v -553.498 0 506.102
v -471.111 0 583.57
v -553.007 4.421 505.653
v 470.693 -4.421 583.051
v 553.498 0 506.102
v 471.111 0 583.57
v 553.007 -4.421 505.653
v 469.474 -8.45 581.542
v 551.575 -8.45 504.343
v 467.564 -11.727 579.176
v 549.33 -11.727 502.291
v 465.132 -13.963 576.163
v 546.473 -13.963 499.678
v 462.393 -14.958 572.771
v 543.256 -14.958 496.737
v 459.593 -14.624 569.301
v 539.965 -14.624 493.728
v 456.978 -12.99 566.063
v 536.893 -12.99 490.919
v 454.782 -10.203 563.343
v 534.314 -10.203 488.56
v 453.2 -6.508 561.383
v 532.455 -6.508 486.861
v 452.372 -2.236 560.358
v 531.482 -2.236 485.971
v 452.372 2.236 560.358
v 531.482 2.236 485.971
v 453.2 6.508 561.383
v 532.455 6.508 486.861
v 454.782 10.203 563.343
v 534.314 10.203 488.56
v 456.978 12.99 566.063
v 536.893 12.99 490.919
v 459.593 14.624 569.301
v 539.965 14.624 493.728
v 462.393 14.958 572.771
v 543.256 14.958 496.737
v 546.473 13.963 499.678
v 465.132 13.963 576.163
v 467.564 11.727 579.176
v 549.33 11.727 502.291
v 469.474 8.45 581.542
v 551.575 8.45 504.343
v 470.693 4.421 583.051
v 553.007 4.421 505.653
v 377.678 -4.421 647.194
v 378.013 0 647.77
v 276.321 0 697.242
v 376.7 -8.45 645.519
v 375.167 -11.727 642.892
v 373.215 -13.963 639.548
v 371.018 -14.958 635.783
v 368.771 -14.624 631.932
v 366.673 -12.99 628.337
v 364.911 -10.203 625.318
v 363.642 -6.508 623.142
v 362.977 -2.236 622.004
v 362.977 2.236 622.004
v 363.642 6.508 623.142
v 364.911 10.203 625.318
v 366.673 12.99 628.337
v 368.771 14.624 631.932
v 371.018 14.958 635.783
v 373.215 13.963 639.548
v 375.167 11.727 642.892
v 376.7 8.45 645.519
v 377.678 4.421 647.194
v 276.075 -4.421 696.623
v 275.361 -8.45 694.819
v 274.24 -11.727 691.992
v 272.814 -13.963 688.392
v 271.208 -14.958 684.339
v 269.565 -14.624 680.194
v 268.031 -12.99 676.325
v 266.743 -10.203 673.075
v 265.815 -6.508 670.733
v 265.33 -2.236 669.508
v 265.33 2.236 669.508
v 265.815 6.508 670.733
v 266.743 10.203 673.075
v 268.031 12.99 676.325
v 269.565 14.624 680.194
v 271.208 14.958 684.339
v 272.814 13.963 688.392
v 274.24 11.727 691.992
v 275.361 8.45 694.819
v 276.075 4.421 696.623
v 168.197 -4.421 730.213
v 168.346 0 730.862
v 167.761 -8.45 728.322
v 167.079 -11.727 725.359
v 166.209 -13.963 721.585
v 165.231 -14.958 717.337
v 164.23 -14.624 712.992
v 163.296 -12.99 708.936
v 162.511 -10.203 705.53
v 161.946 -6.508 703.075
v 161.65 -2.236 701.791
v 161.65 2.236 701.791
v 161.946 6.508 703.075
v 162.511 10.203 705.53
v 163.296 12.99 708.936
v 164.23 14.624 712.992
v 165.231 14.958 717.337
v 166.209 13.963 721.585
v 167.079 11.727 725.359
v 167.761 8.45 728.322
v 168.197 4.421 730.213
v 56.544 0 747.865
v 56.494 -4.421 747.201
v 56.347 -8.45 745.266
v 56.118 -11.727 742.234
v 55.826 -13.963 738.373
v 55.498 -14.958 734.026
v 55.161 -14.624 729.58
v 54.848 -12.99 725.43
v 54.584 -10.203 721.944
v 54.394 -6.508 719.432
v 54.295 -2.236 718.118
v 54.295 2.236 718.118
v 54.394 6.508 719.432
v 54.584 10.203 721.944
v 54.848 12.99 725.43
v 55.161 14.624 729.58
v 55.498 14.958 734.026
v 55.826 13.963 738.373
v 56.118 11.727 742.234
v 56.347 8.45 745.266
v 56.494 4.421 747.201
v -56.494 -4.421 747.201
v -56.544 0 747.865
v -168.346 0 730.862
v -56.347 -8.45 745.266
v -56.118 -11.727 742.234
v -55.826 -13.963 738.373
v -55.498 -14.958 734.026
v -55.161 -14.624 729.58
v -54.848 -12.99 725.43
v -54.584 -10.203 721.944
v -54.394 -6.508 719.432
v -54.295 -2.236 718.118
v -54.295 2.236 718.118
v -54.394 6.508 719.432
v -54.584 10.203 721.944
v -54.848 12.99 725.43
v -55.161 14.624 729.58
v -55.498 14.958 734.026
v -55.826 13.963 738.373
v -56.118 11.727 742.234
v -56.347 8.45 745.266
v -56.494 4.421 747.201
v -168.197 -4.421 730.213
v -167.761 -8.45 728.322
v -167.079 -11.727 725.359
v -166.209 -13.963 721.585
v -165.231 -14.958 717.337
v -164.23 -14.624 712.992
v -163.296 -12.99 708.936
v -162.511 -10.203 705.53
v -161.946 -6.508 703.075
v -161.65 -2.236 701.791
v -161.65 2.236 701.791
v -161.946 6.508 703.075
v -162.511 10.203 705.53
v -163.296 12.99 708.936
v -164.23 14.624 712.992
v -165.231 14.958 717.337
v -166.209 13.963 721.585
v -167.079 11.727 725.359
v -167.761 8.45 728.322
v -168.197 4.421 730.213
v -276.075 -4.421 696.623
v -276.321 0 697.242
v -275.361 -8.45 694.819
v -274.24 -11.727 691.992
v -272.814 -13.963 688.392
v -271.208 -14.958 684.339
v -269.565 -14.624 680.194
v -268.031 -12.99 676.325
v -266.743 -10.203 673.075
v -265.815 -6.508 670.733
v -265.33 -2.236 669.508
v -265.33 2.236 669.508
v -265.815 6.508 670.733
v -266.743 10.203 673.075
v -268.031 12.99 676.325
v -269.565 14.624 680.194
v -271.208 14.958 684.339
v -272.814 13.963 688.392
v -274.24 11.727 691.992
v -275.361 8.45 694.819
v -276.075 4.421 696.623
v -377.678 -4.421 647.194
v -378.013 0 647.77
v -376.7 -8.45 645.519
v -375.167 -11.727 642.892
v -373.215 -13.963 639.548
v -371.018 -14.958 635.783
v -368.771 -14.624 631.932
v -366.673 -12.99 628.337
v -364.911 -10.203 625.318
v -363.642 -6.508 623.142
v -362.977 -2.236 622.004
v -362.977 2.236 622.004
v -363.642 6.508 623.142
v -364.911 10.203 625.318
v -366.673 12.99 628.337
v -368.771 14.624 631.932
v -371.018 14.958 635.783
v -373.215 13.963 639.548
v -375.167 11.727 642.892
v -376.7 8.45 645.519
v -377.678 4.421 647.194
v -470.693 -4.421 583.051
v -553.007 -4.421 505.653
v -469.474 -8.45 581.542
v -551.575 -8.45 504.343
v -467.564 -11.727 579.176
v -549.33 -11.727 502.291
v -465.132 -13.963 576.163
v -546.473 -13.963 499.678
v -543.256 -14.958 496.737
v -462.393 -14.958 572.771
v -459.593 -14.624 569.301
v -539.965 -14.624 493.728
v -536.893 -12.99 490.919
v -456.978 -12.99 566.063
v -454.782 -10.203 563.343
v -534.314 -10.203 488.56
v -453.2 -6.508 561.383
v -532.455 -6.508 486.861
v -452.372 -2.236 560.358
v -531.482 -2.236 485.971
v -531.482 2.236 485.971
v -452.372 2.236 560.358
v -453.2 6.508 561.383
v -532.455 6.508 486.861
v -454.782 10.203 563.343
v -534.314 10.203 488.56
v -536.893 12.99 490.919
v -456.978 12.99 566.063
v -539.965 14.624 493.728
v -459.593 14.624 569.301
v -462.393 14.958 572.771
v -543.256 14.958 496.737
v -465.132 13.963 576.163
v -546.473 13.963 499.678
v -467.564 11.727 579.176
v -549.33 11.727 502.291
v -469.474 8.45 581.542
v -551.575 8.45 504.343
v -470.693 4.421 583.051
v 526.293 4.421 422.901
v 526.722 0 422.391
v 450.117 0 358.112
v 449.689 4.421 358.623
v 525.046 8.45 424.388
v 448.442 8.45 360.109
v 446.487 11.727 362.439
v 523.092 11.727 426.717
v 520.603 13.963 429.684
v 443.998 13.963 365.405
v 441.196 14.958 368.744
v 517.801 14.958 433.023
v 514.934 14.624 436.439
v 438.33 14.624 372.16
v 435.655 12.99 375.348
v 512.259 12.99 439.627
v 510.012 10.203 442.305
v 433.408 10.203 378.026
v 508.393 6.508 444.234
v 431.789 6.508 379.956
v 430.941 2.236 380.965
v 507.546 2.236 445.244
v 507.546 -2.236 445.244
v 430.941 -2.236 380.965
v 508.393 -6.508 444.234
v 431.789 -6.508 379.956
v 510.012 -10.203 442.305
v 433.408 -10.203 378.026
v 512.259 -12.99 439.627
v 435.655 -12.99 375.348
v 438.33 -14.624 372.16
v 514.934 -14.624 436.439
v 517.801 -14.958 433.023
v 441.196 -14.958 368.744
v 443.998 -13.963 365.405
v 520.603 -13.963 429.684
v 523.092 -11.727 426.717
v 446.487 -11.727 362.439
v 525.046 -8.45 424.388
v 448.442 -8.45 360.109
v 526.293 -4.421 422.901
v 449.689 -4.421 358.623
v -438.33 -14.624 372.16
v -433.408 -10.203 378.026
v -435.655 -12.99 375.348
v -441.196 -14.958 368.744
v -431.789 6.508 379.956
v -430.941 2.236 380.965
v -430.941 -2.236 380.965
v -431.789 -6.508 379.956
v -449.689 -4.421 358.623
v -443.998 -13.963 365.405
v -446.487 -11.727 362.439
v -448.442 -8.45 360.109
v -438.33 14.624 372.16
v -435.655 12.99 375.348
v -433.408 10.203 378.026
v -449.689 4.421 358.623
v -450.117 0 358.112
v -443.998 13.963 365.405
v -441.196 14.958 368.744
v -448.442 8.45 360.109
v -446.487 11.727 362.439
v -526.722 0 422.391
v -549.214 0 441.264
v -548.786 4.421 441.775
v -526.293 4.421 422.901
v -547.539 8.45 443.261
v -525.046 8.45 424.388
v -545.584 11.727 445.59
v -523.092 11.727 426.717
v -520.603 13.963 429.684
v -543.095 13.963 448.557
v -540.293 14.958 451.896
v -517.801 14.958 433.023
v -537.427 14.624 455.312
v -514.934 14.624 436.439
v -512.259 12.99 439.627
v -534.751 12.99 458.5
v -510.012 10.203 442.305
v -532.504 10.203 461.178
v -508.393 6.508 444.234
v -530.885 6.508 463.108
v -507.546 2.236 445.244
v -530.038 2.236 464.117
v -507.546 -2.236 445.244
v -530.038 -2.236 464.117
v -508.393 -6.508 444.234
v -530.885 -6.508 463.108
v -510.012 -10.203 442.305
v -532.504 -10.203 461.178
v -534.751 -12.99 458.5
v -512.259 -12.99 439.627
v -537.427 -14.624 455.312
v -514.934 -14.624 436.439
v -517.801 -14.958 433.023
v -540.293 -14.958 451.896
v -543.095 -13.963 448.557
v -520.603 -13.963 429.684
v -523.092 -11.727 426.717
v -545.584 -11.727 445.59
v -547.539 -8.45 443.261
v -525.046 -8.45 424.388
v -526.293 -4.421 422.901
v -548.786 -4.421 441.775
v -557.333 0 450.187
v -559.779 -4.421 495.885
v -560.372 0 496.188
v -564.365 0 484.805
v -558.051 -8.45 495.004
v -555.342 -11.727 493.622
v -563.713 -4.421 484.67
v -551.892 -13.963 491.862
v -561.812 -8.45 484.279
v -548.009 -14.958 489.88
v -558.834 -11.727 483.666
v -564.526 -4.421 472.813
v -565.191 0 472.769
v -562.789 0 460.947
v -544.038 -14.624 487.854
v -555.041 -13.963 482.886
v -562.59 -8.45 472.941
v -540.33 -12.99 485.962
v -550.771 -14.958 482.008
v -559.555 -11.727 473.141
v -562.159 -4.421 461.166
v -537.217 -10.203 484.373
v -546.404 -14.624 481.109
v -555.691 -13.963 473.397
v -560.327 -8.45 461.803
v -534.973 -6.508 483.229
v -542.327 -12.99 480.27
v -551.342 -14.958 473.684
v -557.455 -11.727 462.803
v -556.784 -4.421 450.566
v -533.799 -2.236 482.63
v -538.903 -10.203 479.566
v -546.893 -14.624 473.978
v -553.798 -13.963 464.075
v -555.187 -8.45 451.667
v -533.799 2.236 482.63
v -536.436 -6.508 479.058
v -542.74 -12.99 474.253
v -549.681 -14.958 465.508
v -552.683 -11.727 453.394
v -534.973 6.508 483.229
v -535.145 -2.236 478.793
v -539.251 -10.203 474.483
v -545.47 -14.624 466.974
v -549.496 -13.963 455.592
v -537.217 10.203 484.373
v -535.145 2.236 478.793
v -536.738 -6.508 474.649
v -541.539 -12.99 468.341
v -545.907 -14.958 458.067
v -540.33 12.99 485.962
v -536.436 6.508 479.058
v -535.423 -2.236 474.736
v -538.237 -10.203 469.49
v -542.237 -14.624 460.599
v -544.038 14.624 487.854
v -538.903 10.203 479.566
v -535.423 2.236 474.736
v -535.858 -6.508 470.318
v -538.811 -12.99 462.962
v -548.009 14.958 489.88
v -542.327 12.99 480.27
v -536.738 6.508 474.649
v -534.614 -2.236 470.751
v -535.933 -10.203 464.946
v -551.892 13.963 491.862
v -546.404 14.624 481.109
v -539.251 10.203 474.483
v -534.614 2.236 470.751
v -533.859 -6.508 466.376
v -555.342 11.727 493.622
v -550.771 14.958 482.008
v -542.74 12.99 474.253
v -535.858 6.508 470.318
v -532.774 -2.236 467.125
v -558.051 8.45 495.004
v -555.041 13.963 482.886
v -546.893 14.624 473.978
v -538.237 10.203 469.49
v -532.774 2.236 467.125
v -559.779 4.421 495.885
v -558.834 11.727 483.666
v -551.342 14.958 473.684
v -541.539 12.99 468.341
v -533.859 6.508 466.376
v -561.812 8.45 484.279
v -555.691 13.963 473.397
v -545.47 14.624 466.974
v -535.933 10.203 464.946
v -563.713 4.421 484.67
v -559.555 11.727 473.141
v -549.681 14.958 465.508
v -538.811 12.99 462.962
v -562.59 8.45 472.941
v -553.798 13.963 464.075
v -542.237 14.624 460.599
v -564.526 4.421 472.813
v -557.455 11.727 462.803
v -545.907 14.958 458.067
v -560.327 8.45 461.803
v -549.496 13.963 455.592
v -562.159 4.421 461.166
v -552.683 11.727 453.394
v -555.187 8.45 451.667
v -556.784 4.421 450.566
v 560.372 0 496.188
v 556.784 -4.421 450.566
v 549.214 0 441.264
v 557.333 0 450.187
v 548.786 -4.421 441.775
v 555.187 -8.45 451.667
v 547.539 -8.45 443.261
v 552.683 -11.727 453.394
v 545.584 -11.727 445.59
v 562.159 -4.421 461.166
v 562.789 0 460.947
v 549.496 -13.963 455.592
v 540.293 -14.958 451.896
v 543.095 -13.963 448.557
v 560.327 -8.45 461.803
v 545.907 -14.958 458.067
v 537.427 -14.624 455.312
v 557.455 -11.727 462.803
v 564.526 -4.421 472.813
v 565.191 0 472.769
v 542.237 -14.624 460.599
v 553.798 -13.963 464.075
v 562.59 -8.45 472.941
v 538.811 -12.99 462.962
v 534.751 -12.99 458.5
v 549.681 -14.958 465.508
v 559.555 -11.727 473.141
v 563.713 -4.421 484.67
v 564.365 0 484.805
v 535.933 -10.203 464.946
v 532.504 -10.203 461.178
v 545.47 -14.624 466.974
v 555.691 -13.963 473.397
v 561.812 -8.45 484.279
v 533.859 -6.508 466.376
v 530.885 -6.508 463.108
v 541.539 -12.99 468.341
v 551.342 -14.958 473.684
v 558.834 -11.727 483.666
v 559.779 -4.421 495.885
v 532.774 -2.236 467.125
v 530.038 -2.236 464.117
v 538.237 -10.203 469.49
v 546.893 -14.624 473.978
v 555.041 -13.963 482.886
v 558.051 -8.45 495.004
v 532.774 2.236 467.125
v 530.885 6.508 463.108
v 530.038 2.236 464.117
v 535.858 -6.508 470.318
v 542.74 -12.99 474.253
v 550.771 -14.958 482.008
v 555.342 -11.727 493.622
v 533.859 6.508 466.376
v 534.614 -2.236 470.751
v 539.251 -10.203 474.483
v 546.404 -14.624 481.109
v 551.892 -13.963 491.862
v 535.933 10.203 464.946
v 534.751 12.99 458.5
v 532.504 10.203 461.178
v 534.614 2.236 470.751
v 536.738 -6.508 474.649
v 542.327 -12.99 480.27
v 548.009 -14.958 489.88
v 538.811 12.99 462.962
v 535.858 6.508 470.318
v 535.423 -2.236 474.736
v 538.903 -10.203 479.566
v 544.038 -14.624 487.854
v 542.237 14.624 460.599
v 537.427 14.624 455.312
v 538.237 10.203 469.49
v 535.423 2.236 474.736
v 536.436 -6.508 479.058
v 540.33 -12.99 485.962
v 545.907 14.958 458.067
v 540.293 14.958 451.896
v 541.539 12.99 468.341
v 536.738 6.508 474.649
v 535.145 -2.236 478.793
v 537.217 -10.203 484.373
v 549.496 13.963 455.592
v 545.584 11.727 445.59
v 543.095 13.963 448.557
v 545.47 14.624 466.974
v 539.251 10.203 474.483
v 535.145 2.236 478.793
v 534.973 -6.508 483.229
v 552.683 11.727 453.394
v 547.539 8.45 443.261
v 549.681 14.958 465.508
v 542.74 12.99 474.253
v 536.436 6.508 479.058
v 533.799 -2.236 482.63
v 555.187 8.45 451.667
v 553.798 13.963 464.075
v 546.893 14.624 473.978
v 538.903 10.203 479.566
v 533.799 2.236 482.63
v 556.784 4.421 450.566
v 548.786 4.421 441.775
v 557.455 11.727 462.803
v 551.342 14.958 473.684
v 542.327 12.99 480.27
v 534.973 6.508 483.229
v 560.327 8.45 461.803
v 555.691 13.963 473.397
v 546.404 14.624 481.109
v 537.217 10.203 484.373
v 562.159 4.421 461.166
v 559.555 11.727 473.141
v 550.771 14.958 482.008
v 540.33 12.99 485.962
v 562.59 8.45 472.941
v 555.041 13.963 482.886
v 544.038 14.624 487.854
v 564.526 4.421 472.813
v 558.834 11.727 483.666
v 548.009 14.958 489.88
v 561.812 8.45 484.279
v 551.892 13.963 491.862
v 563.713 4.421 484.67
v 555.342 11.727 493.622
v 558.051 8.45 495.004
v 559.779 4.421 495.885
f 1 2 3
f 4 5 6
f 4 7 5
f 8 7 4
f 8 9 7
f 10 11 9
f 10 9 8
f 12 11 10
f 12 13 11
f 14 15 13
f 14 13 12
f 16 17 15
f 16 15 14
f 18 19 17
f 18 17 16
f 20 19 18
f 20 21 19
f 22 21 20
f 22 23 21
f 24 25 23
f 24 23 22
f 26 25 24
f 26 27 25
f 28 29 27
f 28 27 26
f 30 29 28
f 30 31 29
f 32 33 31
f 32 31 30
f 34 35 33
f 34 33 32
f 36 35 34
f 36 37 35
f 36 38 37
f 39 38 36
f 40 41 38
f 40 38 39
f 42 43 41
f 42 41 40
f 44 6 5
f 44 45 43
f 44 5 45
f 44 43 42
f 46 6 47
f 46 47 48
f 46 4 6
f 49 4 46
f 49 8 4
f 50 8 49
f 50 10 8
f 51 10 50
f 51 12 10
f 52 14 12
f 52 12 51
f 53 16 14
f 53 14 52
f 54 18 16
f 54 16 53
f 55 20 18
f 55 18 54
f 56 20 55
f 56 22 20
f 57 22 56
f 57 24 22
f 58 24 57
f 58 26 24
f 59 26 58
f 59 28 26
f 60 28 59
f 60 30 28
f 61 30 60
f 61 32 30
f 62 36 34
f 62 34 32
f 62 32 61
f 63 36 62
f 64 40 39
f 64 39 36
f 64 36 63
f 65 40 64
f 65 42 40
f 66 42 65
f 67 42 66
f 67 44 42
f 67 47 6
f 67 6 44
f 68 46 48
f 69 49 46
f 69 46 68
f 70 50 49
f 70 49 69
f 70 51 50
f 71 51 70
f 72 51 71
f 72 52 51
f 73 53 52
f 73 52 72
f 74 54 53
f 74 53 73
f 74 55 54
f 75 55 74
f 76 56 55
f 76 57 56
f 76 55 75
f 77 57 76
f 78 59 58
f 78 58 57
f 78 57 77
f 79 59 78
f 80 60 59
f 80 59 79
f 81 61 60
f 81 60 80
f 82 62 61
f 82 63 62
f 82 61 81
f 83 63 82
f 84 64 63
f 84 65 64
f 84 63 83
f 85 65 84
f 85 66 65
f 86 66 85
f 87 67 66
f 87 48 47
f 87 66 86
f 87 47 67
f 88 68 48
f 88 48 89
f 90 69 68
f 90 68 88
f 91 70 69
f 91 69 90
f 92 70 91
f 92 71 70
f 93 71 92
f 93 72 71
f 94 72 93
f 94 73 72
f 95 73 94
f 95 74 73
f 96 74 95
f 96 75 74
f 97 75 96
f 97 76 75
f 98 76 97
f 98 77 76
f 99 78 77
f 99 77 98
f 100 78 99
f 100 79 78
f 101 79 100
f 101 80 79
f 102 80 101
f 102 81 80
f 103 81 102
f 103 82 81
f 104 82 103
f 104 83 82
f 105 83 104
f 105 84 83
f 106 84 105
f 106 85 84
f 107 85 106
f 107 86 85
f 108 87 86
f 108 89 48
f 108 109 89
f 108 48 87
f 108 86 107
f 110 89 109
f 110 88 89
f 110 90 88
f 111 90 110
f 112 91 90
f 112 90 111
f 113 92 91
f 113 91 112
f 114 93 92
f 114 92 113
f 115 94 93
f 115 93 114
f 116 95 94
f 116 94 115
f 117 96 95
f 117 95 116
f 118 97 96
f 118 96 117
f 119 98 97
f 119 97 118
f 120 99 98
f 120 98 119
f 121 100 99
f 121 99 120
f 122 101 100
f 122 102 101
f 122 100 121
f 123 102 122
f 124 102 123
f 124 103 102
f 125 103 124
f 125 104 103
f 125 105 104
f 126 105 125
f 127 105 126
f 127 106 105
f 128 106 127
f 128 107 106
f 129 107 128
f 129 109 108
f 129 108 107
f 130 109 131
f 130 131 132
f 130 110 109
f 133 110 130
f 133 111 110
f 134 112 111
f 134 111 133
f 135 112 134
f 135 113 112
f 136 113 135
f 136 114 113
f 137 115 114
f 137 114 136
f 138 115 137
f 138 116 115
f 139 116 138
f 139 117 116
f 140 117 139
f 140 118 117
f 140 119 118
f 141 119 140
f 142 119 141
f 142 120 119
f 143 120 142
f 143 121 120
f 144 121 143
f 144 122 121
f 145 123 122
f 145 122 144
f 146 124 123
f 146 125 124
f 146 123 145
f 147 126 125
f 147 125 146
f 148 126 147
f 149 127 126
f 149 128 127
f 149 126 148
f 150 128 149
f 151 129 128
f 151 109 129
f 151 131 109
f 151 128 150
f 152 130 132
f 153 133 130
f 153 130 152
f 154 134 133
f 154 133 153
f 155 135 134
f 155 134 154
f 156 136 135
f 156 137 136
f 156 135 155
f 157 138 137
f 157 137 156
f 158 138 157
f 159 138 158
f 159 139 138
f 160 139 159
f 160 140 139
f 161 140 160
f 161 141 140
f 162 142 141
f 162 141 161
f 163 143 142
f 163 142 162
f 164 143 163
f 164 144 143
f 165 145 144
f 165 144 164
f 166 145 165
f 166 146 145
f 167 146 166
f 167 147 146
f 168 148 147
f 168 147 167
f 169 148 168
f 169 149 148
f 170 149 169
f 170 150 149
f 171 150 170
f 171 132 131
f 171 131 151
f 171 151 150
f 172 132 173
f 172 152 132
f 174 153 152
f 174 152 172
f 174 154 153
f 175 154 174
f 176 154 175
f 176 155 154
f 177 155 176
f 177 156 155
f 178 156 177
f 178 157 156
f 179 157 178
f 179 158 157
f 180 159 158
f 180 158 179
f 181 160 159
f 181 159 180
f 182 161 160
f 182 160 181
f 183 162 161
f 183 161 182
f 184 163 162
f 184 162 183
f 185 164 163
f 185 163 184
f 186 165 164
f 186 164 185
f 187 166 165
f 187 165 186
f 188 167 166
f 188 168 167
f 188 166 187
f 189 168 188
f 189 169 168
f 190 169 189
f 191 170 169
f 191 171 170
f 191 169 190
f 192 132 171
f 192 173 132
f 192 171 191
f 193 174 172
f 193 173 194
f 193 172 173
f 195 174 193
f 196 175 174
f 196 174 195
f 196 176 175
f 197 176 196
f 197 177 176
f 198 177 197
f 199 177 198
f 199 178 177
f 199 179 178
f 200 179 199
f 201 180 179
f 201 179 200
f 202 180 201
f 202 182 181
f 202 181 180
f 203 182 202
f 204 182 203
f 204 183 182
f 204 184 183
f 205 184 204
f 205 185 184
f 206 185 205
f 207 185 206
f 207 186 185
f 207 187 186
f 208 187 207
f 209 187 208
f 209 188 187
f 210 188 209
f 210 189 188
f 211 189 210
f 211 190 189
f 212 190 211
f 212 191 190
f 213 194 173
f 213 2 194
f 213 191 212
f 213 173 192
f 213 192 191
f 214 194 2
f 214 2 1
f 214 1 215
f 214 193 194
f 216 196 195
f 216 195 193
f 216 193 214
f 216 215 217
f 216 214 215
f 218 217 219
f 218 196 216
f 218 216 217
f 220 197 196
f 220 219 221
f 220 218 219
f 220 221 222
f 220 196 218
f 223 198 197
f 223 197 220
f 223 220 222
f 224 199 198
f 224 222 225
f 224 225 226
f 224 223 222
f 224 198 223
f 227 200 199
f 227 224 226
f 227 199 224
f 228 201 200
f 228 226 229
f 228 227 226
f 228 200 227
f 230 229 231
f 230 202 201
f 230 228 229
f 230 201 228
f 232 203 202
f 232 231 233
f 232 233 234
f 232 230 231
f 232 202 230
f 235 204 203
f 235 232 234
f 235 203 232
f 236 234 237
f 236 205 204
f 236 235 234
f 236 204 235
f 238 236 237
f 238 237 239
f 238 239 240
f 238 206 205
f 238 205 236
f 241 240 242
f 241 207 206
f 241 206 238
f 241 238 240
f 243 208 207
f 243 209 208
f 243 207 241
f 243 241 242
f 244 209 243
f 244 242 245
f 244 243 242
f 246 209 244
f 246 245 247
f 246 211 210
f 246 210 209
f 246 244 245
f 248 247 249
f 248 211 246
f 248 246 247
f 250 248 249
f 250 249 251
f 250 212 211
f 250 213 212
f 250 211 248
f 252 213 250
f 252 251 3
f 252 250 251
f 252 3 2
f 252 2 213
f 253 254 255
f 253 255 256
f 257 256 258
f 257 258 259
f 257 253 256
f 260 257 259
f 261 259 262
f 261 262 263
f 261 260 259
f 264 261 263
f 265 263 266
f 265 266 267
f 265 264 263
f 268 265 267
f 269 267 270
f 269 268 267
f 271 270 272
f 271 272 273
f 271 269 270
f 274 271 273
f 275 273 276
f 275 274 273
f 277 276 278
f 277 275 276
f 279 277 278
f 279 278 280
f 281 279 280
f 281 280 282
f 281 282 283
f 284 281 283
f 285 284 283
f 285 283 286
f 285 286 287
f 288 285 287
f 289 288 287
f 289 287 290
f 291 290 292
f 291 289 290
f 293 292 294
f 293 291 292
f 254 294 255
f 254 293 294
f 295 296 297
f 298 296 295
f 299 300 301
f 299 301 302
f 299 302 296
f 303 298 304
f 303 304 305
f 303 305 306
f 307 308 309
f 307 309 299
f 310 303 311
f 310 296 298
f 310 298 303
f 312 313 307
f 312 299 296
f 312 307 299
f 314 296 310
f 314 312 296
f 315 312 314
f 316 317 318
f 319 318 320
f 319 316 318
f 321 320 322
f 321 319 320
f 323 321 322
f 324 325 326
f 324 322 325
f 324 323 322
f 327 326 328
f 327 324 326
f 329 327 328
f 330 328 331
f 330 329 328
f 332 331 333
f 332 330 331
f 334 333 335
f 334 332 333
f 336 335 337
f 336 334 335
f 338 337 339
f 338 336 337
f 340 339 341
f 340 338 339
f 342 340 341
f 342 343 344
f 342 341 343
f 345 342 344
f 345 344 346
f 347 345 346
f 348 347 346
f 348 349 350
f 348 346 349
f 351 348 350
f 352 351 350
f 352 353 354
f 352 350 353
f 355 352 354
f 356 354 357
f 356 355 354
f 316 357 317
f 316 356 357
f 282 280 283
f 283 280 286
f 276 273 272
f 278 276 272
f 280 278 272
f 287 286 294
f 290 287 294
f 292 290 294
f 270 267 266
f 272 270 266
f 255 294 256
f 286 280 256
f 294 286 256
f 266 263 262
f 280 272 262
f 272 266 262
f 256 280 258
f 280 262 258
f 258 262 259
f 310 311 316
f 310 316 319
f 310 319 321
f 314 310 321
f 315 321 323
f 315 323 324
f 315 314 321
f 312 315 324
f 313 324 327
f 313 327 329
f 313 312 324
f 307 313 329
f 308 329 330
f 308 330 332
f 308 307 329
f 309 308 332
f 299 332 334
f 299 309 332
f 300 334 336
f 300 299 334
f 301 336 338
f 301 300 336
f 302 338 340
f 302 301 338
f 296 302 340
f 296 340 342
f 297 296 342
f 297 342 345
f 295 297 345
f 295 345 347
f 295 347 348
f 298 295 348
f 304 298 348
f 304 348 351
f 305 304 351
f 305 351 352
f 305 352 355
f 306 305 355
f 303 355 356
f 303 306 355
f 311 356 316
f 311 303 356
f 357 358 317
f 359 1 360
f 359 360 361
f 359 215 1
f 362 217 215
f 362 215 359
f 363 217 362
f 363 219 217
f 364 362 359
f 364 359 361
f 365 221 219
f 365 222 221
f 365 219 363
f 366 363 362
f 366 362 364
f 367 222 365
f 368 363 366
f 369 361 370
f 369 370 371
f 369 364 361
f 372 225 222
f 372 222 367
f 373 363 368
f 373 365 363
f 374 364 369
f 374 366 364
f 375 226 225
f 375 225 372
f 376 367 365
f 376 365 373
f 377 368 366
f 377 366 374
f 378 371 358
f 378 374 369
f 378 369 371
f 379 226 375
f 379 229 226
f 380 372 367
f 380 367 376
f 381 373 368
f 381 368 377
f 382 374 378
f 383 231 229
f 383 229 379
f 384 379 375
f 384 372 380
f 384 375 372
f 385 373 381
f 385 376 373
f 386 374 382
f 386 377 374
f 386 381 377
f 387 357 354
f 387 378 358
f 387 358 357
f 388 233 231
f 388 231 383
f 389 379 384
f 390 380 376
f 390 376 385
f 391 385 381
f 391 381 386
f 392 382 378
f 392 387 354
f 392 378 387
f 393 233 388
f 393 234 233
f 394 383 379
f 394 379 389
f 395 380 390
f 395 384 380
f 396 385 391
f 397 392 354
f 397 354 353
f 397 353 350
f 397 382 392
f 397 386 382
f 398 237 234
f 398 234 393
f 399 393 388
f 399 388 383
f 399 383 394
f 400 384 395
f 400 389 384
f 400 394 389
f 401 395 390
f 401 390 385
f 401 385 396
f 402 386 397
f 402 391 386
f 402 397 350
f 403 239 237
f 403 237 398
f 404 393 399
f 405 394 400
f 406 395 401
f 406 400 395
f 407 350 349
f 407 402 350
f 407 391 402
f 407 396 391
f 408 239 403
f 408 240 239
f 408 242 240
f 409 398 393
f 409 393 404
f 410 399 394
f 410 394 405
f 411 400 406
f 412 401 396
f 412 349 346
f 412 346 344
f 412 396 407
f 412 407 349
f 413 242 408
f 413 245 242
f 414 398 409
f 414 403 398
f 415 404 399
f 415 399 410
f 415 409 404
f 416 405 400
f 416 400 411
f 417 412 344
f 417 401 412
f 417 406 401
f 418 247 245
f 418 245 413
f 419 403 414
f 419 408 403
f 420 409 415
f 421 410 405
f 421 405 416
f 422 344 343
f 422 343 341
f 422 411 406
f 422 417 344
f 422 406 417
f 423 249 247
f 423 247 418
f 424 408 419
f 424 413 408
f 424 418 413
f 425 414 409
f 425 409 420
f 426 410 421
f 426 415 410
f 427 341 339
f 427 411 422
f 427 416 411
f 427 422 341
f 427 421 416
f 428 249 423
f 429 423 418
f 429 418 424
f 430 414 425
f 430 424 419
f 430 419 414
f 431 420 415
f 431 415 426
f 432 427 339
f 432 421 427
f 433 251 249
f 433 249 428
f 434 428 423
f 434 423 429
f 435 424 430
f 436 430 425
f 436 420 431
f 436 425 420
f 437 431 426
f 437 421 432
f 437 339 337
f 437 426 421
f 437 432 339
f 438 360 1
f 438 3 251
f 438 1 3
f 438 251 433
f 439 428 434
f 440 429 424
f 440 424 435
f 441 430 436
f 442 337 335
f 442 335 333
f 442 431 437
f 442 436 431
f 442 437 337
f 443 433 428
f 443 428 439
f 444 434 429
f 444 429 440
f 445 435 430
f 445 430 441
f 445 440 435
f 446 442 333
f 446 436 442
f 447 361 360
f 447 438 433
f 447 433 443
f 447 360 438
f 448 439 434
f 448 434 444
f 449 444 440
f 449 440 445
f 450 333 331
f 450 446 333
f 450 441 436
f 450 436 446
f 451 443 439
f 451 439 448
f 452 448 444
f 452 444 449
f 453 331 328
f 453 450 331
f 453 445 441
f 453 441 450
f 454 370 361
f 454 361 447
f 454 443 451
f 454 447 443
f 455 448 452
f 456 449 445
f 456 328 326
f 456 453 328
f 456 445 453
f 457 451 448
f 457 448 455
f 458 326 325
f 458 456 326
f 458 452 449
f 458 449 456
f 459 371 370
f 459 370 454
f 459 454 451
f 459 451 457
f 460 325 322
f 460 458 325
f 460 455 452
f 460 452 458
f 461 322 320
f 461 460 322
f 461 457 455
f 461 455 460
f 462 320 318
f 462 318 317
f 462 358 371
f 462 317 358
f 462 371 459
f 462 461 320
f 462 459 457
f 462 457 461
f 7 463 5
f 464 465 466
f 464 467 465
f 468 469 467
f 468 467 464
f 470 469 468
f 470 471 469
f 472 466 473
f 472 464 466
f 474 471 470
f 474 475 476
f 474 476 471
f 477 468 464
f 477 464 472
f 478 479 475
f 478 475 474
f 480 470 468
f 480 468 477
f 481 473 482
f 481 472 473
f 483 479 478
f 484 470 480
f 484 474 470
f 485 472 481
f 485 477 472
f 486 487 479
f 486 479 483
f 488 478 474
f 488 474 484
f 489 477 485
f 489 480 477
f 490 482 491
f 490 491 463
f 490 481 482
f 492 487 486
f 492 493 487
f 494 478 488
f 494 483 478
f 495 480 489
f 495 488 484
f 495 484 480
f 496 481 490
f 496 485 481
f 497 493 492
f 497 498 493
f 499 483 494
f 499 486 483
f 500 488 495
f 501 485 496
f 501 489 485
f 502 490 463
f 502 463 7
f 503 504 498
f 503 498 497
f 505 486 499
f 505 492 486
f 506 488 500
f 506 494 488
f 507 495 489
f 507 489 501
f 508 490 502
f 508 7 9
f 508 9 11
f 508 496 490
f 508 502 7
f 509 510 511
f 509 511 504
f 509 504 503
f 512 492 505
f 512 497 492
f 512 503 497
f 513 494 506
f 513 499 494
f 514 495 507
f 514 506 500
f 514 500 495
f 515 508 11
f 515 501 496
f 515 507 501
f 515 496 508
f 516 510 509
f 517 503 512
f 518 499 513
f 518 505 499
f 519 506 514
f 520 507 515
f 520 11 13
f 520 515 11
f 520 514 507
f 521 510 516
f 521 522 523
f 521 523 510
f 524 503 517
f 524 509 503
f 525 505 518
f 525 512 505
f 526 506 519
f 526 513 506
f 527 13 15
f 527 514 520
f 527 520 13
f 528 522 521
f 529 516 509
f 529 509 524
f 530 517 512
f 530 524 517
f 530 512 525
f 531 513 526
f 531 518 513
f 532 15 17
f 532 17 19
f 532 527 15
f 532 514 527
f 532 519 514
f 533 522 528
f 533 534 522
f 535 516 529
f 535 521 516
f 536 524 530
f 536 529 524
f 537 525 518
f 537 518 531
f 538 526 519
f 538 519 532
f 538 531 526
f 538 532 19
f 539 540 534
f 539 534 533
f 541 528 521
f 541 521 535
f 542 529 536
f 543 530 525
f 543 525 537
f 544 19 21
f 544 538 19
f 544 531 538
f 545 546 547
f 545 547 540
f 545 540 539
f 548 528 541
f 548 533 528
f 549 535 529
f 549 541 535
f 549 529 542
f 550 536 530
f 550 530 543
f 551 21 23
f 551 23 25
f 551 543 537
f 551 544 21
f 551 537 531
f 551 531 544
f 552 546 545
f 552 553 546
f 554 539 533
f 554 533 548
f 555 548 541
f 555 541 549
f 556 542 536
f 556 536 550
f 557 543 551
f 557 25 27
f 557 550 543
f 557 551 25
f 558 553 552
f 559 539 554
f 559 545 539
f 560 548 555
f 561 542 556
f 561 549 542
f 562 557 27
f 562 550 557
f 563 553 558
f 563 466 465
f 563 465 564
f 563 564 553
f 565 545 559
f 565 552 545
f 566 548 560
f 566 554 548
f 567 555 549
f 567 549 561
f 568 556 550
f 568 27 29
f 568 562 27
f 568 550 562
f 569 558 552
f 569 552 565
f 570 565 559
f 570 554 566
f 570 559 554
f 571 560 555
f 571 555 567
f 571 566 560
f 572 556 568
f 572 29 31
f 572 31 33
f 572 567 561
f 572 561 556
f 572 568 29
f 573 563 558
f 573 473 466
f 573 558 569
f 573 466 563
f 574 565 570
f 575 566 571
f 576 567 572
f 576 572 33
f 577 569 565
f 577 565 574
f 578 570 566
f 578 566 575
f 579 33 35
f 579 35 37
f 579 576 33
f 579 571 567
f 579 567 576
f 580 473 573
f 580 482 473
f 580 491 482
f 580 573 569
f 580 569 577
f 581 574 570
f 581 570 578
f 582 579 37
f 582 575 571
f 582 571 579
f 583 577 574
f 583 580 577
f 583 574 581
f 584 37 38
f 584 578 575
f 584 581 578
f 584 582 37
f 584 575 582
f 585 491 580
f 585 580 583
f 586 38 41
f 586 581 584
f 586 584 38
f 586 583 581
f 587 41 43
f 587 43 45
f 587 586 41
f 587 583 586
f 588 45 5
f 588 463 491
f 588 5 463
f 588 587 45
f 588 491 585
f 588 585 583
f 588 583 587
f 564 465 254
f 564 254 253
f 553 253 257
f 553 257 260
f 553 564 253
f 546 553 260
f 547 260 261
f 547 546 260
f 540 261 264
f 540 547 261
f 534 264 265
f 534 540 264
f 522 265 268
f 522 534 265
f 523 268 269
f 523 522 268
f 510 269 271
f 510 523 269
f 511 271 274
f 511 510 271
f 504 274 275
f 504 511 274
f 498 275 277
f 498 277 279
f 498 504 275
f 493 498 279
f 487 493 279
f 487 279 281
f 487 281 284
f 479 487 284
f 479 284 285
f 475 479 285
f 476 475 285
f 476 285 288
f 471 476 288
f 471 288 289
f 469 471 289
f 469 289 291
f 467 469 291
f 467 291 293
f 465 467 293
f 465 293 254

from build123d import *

# Parameters (mm, degrees)
LEFT_CROSS_SECTION_SKETCH_R   = 15
RIGHT_START                   = 100
RIGHT_CROSS_SECTION_SKETCH_R  = 15
RIGHT_JOINT_EXTRUDE_DEPTH     = 100
LEFT_CROSS_SECTION_SKETCH_2_R = 15
LEFT_JOINT_EXTRUDE_DEPTH      = 100


with BuildPart() as part:
    # Bar Sweep: sweep along a path in Overhead Sketch
    with BuildLine(Plane(origin=(0, 0, 0), x_dir=(1, 0, 0), z_dir=(0, 1, 0))) as bar_sweep_path:
        Line((517.079999105, -433.881636538), (539.572146309, -452.754788961))
        ThreePointArc((539.572146309, -452.754788961), (550.223234493, -473.758055128), (542.428454955, -495.980212564))
        ThreePointArc((542.428454955, -495.980212564), (0, -735), (-542.428454955, -495.980212564))
        ThreePointArc((-542.428454955, -495.980212564), (-550.223234493, -473.758055128), (-539.572146309, -452.754788961))
        Line((-539.572146309, -452.754788961), (-517.079999105, -433.881636538))
    # Left Cross Section Sketch → Bar Sweep (sweep)
    with BuildSketch(Plane(origin=(517.079999105, 0, 433.881636538), x_dir=(0.6427876096865377, 0, -0.7660444431189796), z_dir=(0.7660444431189796, 0, 0.6427876096865377))):
        Circle(LEFT_CROSS_SECTION_SKETCH_R)
    sweep(path=bar_sweep_path.line)

    # Right Cross Section Sketch → Right Joint Extrude (add)
    with BuildSketch(Plane(origin=(-517.079999105, 0, 433.881636538), x_dir=(-0.642787609686537, 0, -0.7660444431189801), z_dir=(0.7660444431189801, 0, -0.6427876096865369)).offset(RIGHT_START)):
        Circle(RIGHT_CROSS_SECTION_SKETCH_R)
    extrude(amount=-RIGHT_JOINT_EXTRUDE_DEPTH)

    # Left Cross Section Sketch<2> → Left Joint Extrude (add)
    with BuildSketch(Plane(origin=(517.079999105, 0, 433.881636538), x_dir=(0.6427876096865377, 0, -0.7660444431189796), z_dir=(0.7660444431189796, 0, 0.6427876096865377))):
        Circle(LEFT_CROSS_SECTION_SKETCH_2_R)
    extrude(amount=-LEFT_JOINT_EXTRUDE_DEPTH)


solid = part.part
